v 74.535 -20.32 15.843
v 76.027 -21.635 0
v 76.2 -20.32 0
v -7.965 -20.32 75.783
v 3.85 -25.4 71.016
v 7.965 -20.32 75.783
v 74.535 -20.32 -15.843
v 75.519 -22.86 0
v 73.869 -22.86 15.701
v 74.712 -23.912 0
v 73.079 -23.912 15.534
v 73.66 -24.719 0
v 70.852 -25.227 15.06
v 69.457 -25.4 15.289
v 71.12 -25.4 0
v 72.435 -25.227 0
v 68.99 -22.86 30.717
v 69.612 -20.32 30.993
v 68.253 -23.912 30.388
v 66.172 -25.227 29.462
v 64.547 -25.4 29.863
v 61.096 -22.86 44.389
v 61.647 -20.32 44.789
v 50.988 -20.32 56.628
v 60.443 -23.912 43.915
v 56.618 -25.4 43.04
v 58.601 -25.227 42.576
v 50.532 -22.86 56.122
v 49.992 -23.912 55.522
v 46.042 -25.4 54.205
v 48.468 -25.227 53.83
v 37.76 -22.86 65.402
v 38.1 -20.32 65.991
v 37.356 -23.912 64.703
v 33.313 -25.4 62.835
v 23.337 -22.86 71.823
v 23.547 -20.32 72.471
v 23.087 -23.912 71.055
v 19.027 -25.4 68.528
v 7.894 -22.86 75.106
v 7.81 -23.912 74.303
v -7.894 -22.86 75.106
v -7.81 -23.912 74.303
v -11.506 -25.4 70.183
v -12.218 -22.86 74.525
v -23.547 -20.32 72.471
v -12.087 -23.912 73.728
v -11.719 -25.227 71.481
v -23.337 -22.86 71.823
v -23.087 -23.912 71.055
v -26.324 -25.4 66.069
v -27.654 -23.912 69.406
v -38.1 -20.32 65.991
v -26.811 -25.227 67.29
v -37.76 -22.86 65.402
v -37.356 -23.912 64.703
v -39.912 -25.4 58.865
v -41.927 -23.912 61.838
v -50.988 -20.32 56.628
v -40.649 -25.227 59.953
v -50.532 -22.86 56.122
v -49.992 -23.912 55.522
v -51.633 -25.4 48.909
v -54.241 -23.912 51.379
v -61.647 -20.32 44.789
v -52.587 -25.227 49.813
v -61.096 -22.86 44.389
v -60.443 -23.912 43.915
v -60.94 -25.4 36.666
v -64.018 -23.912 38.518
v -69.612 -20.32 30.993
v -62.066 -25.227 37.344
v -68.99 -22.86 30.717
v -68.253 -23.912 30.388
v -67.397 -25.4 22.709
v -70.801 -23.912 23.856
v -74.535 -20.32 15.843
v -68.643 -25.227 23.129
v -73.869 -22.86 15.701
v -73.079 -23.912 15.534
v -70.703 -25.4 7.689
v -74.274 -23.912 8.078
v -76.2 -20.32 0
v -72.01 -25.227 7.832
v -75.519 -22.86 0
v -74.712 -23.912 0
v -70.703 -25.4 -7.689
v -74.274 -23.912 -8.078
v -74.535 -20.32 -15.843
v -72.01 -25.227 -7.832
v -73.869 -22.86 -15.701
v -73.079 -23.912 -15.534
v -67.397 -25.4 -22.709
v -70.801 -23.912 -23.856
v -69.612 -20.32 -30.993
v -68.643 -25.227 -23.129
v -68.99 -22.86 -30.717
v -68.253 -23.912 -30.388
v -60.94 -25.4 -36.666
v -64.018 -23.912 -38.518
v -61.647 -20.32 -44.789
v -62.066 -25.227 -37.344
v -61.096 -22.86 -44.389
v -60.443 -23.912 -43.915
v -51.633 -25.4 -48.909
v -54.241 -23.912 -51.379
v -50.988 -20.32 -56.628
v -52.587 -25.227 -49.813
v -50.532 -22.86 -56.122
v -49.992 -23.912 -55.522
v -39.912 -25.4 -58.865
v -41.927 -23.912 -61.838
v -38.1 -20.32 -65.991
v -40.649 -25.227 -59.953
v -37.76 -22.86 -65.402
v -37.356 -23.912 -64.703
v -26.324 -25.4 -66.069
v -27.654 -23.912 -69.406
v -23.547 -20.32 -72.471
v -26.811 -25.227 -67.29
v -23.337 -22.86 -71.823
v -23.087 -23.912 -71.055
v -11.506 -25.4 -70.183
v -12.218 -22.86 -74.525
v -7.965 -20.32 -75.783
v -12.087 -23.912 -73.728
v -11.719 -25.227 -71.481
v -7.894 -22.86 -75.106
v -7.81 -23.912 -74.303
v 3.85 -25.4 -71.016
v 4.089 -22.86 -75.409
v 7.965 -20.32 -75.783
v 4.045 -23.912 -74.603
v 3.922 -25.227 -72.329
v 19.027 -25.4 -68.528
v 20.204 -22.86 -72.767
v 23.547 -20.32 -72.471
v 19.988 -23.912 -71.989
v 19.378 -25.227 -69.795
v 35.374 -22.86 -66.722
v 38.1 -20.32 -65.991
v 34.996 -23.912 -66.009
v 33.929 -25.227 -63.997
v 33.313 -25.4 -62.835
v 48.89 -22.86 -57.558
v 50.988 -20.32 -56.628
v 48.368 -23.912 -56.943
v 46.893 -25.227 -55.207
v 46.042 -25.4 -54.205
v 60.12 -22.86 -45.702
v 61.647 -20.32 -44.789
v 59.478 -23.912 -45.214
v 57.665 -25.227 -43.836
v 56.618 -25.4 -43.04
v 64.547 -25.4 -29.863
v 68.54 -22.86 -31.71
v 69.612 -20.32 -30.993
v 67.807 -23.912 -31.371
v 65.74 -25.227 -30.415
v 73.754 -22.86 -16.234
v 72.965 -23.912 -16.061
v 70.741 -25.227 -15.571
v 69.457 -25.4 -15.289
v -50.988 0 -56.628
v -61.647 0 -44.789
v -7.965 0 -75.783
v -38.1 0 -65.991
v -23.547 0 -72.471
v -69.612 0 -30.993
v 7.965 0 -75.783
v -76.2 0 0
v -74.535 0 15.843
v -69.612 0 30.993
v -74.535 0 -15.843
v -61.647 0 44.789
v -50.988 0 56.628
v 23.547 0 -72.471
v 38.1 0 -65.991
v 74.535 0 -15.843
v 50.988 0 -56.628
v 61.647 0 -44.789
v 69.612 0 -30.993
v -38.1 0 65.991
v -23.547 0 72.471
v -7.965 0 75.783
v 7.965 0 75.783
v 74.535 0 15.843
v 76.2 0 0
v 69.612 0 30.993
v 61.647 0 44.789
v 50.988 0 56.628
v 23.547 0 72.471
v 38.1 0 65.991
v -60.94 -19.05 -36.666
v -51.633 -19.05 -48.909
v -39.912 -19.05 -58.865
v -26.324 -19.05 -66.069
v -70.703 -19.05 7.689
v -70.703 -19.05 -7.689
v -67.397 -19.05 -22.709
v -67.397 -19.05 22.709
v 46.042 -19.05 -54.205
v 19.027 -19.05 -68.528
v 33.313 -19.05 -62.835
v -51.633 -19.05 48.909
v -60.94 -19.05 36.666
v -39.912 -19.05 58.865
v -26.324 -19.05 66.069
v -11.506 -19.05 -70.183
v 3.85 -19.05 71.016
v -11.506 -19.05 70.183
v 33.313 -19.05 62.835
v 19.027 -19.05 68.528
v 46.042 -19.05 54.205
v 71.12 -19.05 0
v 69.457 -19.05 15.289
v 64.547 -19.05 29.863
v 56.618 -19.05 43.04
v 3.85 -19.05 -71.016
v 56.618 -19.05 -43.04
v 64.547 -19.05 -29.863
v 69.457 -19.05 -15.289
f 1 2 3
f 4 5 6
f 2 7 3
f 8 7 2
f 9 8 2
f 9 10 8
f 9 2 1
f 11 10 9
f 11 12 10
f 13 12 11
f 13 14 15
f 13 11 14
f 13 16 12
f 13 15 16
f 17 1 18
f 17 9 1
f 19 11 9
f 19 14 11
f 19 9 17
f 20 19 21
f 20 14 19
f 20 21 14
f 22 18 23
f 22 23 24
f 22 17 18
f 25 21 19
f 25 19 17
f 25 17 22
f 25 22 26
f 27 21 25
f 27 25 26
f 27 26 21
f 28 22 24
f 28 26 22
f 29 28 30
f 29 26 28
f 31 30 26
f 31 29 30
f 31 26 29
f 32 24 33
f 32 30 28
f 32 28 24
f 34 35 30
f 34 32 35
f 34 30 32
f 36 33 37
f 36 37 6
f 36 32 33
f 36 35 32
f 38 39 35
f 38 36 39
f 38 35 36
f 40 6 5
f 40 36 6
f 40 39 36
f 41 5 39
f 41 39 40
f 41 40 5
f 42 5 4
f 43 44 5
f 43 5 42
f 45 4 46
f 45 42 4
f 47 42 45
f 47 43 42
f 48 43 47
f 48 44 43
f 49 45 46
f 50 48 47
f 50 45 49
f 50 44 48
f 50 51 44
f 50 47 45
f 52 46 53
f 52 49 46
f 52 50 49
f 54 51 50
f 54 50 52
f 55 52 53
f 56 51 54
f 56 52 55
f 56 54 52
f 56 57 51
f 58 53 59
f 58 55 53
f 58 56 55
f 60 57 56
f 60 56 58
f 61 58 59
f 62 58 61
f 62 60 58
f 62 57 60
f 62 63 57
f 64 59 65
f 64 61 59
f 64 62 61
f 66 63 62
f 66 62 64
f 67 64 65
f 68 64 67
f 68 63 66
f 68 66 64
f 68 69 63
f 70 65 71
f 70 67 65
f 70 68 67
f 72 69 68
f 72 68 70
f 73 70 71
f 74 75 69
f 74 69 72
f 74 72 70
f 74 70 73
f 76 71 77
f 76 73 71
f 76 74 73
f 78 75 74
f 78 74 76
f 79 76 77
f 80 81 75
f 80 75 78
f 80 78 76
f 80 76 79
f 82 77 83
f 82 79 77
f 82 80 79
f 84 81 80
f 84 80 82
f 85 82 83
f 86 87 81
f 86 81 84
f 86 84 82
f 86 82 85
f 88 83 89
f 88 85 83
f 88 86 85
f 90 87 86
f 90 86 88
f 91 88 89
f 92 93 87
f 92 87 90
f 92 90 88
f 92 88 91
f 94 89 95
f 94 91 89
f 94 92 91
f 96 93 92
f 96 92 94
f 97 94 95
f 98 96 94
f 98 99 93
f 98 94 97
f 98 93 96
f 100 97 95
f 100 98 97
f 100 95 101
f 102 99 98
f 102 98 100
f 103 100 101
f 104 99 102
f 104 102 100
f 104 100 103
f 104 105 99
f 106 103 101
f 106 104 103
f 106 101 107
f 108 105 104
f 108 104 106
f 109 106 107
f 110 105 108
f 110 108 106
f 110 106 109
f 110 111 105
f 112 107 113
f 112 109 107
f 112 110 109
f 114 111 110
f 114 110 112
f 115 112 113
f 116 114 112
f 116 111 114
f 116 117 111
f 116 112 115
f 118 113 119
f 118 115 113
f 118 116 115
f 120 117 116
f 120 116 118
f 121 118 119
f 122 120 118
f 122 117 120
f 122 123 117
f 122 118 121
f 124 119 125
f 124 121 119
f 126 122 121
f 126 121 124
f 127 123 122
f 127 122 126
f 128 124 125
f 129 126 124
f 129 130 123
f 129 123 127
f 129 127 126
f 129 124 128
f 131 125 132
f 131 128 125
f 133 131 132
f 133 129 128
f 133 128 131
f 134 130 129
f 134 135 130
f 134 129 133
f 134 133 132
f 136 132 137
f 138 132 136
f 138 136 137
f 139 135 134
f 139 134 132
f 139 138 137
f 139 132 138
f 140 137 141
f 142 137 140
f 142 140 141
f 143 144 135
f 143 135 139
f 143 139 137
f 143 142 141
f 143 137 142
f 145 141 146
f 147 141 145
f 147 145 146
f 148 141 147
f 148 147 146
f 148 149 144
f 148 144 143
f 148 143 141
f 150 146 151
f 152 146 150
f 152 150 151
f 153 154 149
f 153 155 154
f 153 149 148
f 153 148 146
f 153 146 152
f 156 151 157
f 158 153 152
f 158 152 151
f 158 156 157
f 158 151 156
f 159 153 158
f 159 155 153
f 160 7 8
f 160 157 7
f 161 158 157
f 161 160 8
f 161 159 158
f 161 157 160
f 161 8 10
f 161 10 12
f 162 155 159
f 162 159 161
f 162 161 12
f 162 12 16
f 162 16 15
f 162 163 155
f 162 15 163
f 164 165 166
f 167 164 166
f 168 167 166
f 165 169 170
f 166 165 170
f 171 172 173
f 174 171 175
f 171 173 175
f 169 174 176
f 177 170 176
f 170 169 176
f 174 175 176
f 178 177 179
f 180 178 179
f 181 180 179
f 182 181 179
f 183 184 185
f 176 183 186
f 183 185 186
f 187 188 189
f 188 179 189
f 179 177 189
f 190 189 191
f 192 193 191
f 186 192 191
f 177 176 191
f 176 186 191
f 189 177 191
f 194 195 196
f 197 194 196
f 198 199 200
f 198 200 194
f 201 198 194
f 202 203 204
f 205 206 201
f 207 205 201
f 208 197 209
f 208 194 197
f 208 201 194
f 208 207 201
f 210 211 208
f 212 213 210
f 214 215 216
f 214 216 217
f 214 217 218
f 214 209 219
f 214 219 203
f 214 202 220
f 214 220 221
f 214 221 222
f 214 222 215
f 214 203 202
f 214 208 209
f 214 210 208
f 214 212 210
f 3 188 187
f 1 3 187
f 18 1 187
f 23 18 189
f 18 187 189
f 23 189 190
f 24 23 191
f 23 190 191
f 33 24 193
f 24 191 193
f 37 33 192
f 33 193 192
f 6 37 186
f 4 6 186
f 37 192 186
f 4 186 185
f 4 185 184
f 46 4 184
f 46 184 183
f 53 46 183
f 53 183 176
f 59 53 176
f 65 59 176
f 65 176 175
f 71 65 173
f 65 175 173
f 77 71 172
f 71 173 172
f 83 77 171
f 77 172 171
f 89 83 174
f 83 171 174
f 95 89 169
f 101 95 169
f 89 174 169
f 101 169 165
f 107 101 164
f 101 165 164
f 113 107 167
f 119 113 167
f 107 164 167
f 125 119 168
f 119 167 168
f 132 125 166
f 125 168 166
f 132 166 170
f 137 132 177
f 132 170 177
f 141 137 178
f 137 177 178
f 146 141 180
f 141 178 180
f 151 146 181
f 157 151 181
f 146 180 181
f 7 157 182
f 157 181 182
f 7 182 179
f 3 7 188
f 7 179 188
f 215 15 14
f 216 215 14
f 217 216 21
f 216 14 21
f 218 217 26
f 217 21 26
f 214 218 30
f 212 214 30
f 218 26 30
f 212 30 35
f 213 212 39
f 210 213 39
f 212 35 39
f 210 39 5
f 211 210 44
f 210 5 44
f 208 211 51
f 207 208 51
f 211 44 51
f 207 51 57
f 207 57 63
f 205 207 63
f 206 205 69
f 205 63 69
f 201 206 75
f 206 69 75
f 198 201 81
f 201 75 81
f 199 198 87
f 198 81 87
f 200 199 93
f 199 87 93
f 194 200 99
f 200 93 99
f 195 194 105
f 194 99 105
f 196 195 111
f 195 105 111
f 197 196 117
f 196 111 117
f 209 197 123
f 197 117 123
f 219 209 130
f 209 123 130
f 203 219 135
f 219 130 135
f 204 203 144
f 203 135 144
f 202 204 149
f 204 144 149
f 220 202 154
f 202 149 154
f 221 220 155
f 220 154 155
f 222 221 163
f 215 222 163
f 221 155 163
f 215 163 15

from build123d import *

# Parameters (mm, degrees)
F0_R      = 76.2
F1_DEPTH  = 25.4
F2_R      = 5.08
F1_FACE_R = 71.12
F3_DEPTH  = 6.35


with BuildPart() as f1:
    # F0 (on Front) → F1 (new body)
    with BuildSketch(Plane.XZ):
        Circle(F0_R)
    extrude(amount=F1_DEPTH)

    # F2
    f2_edges = [f1.edges().sort_by_distance(p)[0] for p in [
        (-76.2, -25.4, 0),
    ]]
    fillet(f2_edges, radius=F2_R)

    # F1_face (on face) → F3 (cut)
    with BuildSketch(Plane.XZ.offset(25.4)):
        Circle(F1_FACE_R)
    extrude(amount=-F3_DEPTH, mode=Mode.SUBTRACT)


solid = f1.part
